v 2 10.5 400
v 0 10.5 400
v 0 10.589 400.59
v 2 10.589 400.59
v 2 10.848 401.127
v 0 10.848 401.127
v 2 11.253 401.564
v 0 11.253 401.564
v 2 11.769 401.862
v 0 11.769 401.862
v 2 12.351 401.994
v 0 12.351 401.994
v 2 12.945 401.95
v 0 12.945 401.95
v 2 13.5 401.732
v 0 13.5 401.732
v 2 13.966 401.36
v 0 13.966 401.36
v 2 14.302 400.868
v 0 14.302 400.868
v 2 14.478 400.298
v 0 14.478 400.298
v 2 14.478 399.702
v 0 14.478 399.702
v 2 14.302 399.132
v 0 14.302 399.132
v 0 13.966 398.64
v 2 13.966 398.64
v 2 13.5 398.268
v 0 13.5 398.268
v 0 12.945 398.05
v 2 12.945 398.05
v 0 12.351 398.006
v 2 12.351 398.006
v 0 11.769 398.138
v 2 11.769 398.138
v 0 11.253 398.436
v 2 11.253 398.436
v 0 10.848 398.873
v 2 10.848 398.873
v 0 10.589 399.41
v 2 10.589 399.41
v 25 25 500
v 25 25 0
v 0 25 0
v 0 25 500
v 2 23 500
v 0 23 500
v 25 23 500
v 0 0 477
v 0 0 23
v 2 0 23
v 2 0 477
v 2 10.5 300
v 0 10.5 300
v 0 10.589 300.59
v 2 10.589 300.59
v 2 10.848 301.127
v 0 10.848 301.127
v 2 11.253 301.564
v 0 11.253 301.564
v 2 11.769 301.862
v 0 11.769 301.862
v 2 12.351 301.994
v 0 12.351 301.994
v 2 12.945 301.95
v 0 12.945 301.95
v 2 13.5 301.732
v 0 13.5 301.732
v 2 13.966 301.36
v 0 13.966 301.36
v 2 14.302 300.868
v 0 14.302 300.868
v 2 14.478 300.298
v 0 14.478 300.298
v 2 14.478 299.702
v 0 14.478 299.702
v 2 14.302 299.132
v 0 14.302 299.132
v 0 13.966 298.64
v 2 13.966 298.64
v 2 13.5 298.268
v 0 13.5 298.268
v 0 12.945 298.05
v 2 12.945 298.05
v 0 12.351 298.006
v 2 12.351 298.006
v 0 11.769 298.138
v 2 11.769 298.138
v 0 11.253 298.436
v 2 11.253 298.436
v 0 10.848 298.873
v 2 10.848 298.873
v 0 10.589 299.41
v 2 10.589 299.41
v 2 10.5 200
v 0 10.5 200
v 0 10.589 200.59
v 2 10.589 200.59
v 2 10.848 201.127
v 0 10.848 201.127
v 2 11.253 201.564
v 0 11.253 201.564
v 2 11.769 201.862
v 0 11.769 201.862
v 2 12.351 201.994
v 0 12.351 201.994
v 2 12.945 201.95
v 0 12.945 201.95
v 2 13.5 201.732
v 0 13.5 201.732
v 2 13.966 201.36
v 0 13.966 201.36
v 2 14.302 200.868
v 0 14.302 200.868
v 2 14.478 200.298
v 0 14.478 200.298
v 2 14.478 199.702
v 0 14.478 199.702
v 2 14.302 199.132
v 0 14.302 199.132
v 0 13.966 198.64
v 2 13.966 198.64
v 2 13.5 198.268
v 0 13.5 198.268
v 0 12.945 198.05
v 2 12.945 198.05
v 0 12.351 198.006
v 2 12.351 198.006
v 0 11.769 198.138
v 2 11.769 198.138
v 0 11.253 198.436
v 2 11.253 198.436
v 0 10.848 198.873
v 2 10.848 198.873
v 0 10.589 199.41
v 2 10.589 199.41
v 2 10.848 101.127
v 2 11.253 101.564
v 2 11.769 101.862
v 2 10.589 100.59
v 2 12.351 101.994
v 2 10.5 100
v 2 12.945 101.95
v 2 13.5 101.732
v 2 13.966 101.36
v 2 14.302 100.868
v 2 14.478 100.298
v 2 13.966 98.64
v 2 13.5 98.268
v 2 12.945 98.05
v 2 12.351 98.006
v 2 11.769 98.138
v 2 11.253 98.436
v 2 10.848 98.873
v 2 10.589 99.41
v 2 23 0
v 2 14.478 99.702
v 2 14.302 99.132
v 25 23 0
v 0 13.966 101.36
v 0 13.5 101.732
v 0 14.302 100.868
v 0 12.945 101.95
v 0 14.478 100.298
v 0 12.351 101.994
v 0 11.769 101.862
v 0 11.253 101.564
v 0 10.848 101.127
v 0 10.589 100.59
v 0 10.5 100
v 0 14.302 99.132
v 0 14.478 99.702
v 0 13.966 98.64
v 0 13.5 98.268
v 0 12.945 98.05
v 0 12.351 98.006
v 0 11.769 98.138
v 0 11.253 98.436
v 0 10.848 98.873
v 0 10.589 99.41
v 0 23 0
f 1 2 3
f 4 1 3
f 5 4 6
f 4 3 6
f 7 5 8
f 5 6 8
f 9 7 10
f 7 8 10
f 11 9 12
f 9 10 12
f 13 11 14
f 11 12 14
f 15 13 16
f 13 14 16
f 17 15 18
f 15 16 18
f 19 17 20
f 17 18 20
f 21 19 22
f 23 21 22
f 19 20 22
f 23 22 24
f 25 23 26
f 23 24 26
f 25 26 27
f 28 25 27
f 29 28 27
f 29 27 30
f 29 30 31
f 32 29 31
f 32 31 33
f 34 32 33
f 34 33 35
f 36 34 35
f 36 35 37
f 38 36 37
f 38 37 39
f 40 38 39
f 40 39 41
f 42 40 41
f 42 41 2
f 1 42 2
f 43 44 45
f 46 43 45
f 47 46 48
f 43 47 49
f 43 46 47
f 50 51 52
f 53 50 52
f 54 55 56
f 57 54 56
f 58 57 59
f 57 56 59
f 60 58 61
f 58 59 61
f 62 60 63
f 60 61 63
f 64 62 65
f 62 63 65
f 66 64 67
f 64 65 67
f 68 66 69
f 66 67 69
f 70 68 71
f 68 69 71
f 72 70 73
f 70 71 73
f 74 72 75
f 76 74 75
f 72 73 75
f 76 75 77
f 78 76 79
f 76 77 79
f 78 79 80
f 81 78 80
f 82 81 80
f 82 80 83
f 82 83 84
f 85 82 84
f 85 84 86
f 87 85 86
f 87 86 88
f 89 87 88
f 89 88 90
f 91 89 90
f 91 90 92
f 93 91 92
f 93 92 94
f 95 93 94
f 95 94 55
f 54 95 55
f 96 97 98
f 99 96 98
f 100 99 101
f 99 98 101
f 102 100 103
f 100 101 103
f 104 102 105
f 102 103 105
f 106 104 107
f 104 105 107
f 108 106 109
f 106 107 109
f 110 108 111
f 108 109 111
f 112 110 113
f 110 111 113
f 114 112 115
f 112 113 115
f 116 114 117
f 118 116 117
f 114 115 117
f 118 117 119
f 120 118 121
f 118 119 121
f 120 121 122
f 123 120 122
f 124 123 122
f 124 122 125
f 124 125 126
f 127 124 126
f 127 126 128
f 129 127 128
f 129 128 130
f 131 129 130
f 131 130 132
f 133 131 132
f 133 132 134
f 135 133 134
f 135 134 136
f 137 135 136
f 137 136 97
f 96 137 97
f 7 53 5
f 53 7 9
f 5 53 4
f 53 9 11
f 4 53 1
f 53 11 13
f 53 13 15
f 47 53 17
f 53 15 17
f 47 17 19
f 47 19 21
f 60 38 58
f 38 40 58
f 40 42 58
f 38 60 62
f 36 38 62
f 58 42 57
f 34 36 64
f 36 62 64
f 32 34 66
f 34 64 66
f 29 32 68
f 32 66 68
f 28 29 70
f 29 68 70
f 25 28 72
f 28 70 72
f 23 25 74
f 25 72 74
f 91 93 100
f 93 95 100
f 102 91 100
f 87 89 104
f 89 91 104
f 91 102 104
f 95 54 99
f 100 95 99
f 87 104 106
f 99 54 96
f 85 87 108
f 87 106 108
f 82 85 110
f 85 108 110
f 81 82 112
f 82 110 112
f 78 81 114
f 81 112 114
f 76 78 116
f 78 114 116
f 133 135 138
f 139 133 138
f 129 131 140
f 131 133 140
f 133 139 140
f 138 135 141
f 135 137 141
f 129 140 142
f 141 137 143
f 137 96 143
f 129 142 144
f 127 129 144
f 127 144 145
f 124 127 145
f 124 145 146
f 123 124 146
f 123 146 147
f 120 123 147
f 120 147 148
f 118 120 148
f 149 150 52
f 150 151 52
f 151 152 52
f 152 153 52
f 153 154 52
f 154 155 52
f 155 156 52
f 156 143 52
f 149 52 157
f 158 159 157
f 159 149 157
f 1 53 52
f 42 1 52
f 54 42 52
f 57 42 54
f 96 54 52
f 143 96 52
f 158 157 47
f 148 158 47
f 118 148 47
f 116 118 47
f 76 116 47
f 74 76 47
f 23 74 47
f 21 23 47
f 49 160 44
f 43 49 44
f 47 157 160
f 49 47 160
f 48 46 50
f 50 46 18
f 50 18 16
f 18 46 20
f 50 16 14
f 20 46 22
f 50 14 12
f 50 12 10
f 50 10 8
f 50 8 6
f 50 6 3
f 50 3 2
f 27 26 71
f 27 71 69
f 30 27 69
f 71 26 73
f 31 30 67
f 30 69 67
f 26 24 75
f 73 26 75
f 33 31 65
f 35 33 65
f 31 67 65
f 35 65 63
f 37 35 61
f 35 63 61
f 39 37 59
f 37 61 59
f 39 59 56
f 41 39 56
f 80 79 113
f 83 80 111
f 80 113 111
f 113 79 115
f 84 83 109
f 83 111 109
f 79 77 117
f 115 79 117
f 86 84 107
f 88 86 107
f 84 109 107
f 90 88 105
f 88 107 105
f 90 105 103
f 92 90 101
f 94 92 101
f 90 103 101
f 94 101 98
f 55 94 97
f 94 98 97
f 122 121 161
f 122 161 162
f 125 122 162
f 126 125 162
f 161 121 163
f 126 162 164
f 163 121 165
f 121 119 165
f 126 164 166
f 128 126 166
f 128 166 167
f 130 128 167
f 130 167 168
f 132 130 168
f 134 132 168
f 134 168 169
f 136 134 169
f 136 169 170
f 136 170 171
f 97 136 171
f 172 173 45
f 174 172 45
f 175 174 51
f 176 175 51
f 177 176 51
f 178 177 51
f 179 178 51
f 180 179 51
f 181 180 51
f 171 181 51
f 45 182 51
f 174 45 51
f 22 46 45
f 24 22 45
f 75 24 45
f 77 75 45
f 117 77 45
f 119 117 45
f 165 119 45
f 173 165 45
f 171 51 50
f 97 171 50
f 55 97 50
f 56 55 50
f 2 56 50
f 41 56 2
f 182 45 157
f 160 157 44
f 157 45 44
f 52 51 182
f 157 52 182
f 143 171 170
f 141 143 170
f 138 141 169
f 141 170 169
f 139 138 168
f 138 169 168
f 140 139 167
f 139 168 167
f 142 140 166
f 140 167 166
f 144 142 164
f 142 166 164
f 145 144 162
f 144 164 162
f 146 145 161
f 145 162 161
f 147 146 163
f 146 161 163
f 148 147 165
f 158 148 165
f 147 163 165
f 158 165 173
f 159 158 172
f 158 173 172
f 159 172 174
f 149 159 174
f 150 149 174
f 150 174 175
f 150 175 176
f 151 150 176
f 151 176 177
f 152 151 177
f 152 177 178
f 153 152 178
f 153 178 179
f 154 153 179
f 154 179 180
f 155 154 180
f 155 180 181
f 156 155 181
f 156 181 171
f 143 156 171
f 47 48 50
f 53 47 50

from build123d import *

# Parameters (mm, degrees)
BOSS_EXTRUDE1_DEPTH = 500
SKETCH2_R           = 2
CUT_EXTRUDE1_DEPTH  = 10
CUT_EXTRUDE2_DEPTH  = 10


with BuildPart() as part:
    # Sketch1 → Boss-Extrude1 (new body)
    with BuildSketch(Plane.XY):
        Polygon((0, 25), (0, 0), (2, 0), (2, 23), (25, 23), (25, 25), (5, 25), align=None)
    extrude(amount=BOSS_EXTRUDE1_DEPTH)

    # Sketch2 → Cut-Extrude1 (cut)
    with BuildSketch(Plane.ZY):
        with Locations(Location((100, 12.5, 0), (0, 0, 270))):
            Circle(SKETCH2_R)
        with Locations(Location((200, 12.5, 0), (0, 0, 270))):
            Circle(SKETCH2_R)
        with Locations(Location((300, 12.5, 0), (0, 0, 270))):
            Circle(SKETCH2_R)
        with Locations(Location((400, 12.5, 0), (0, 0, 270))):
            Circle(SKETCH2_R)
    extrude(amount=-CUT_EXTRUDE1_DEPTH, mode=Mode.SUBTRACT)

    # Sketch3 → Cut-Extrude2 (cut)
    with BuildSketch(Plane.ZY):
        Polygon((23, 0), (0, 23), (0, 0), align=None)
        Polygon((500, 23), (477, 0), (500, 0), align=None)
    extrude(amount=-CUT_EXTRUDE2_DEPTH, mode=Mode.SUBTRACT)


solid = part.part
